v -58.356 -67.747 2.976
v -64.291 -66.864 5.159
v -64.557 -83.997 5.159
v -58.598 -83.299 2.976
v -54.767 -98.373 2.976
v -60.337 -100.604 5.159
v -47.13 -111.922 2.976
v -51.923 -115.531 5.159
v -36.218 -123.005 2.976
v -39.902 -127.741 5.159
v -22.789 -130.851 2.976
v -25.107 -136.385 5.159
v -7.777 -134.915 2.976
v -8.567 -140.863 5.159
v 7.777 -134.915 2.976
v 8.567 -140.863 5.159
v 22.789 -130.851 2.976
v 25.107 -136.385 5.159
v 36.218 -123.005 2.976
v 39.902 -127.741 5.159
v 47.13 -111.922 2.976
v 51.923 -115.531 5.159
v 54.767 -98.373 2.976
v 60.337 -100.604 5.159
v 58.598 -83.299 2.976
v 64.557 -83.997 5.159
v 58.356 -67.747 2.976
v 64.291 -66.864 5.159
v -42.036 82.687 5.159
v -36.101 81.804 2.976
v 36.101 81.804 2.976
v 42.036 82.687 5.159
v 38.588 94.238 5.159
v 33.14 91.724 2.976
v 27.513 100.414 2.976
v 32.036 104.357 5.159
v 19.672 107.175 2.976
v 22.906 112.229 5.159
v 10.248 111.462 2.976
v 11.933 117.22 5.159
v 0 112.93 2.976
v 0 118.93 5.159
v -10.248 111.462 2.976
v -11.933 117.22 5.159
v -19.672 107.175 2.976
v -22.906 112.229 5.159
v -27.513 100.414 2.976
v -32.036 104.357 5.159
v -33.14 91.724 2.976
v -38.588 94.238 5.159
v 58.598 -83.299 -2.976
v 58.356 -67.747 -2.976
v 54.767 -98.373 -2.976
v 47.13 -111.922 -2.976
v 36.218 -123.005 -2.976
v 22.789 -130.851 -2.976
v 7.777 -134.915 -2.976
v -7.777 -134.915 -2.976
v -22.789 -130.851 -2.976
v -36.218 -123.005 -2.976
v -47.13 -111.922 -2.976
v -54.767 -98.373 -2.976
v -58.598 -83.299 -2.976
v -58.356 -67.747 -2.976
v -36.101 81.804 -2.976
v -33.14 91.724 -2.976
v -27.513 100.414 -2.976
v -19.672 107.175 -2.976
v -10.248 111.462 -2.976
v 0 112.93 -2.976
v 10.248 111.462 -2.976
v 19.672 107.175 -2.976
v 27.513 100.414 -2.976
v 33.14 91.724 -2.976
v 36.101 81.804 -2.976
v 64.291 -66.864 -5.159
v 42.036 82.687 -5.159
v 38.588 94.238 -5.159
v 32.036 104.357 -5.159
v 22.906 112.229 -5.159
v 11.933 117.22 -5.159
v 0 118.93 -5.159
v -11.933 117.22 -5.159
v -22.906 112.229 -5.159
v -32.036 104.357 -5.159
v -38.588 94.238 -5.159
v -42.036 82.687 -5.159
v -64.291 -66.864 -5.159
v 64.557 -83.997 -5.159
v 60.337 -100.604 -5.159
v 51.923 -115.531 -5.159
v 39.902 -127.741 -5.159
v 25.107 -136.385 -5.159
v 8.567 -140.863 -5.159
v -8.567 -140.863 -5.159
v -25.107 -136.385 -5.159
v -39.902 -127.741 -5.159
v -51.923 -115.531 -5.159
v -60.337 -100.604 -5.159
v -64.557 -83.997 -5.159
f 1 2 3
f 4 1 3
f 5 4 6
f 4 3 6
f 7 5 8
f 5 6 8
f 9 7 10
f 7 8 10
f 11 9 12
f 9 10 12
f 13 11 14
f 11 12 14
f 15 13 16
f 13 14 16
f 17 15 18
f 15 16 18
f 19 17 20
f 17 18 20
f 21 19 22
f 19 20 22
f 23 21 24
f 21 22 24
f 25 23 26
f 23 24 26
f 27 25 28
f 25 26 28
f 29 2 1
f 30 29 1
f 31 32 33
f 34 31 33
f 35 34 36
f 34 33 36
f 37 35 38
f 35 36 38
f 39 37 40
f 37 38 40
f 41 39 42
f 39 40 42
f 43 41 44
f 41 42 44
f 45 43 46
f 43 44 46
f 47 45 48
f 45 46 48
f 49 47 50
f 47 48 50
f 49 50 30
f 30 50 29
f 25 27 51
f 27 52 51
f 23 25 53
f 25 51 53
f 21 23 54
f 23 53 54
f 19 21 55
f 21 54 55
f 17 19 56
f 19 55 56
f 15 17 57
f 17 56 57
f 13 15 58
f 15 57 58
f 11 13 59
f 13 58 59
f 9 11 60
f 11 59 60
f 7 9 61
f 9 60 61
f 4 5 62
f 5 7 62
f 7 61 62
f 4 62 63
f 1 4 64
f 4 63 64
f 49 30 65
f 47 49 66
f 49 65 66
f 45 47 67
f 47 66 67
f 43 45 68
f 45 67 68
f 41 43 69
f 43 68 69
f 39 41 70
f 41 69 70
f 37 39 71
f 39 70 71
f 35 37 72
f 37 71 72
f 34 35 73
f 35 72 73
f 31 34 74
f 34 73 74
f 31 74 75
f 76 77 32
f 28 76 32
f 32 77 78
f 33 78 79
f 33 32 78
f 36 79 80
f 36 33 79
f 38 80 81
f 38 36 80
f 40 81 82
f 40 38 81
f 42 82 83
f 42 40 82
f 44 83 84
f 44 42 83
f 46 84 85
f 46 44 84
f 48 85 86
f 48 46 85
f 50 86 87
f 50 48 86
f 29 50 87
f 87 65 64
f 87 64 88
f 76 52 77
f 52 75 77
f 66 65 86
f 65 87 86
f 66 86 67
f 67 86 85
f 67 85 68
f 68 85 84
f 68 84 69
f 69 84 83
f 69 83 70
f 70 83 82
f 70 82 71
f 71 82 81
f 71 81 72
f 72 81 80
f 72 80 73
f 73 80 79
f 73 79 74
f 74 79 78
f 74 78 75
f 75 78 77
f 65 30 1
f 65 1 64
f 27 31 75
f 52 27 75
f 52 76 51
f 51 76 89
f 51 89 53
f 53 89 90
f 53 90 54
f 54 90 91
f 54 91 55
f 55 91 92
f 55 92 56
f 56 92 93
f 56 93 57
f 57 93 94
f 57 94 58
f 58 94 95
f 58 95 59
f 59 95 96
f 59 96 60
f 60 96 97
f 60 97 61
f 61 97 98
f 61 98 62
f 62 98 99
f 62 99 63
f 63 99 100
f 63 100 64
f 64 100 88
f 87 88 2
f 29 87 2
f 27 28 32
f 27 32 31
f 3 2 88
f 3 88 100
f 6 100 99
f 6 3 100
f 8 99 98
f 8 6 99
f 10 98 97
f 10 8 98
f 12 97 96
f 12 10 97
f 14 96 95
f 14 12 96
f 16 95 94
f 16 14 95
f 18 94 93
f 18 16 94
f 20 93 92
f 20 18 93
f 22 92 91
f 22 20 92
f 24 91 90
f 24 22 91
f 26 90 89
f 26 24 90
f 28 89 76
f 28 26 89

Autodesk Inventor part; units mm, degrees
ref_plane "YZ Plane" through (0, 0, 0) normal (1, 0, 0) x (0, 1, 0)
ref_plane "XZ Plane" through (0, 0, 0) normal (0, 1, 0) x (-1, 0, 0)
ref_plane "XY Plane" through (0, 0, 0) normal (0, 0, 1) x (1, 0, 0)
sketch "Sketch2" plane through (0, 0, 0) normal (0, 0, 1) x (1, 0, 0)
  line L0 (0, 76.4315) -> (0, -76.4315) construction
  arc A0 (-39.5643, 82.3191) -> (39.5643, 82.3191) centre (0, 76.4315) ccw construction
  arc A1 (61.8193, -67.2321) -> (-61.8193, -67.2321) centre (0, -76.4315) ccw construction
  line L1 (61.8193, -67.2321) -> (39.5643, 82.3191)
  line L2 (-61.8193, -67.2321) -> (-39.5643, 82.3191)
  arc A2 (39.5643, 82.3191) -> (-39.5643, 82.3191) centre (0, 76.4315) ccw
  arc A3 (-61.8193, -67.2321) -> (61.8193, -67.2321) centre (0, -76.4315) ccw
  line L3 (0, 76.4315) -> (0, 116.4315) construction
  point P0 (0, 0)
  point P1 (0, 0)
  dimension "d1" = 152.863
  dimension "d2" = 80
  dimension "d3" = 125
sketch "Sketch3" plane through (0, 0, 0) normal (1, 0, 0) x (0, 1, 0)
  line L0 (118.9301, 0) -> (112.9301, 0) construction
  line L1 (116.4315, 4.25) -> (116.4315, -4.25) construction
  line L2 (118.9301, 5.1594) -> (118.9301, -5.1594)
  line L3 (118.9301, -5.1594) -> (112.9301, -2.9756)
  line L4 (112.9301, -2.9756) -> (112.9301, 2.9756)
  line L5 (112.9301, 2.9756) -> (118.9301, 5.1594)
  point P0 (0, 0)
  point P1 (0, 0)
  point P2 (116.4315, 0)
  point P3 (116.4315, 0)
  point P4 (116.4315, 0)
  dimension "d4" = 8.5
  dimension "d5" = 2.4986
  dimension "d6" = 40
  dimension "d7" = 6
sweep "Sweep1" add profiles "Sketch3" path "Sketch2"
equation "\"d4\" = d8"
equation "\"d5\" = d9"
equation "\"d6\" = d10"
equation "\"d7\" = d11"
equation "\"d8\" = 8.5"
equation "\"d9\" = 2.49859"
equation "\"d10\" = 40deg"
equation "\"d11\" = 6"
properties part number "PWTR-0097" material "Rubber"
